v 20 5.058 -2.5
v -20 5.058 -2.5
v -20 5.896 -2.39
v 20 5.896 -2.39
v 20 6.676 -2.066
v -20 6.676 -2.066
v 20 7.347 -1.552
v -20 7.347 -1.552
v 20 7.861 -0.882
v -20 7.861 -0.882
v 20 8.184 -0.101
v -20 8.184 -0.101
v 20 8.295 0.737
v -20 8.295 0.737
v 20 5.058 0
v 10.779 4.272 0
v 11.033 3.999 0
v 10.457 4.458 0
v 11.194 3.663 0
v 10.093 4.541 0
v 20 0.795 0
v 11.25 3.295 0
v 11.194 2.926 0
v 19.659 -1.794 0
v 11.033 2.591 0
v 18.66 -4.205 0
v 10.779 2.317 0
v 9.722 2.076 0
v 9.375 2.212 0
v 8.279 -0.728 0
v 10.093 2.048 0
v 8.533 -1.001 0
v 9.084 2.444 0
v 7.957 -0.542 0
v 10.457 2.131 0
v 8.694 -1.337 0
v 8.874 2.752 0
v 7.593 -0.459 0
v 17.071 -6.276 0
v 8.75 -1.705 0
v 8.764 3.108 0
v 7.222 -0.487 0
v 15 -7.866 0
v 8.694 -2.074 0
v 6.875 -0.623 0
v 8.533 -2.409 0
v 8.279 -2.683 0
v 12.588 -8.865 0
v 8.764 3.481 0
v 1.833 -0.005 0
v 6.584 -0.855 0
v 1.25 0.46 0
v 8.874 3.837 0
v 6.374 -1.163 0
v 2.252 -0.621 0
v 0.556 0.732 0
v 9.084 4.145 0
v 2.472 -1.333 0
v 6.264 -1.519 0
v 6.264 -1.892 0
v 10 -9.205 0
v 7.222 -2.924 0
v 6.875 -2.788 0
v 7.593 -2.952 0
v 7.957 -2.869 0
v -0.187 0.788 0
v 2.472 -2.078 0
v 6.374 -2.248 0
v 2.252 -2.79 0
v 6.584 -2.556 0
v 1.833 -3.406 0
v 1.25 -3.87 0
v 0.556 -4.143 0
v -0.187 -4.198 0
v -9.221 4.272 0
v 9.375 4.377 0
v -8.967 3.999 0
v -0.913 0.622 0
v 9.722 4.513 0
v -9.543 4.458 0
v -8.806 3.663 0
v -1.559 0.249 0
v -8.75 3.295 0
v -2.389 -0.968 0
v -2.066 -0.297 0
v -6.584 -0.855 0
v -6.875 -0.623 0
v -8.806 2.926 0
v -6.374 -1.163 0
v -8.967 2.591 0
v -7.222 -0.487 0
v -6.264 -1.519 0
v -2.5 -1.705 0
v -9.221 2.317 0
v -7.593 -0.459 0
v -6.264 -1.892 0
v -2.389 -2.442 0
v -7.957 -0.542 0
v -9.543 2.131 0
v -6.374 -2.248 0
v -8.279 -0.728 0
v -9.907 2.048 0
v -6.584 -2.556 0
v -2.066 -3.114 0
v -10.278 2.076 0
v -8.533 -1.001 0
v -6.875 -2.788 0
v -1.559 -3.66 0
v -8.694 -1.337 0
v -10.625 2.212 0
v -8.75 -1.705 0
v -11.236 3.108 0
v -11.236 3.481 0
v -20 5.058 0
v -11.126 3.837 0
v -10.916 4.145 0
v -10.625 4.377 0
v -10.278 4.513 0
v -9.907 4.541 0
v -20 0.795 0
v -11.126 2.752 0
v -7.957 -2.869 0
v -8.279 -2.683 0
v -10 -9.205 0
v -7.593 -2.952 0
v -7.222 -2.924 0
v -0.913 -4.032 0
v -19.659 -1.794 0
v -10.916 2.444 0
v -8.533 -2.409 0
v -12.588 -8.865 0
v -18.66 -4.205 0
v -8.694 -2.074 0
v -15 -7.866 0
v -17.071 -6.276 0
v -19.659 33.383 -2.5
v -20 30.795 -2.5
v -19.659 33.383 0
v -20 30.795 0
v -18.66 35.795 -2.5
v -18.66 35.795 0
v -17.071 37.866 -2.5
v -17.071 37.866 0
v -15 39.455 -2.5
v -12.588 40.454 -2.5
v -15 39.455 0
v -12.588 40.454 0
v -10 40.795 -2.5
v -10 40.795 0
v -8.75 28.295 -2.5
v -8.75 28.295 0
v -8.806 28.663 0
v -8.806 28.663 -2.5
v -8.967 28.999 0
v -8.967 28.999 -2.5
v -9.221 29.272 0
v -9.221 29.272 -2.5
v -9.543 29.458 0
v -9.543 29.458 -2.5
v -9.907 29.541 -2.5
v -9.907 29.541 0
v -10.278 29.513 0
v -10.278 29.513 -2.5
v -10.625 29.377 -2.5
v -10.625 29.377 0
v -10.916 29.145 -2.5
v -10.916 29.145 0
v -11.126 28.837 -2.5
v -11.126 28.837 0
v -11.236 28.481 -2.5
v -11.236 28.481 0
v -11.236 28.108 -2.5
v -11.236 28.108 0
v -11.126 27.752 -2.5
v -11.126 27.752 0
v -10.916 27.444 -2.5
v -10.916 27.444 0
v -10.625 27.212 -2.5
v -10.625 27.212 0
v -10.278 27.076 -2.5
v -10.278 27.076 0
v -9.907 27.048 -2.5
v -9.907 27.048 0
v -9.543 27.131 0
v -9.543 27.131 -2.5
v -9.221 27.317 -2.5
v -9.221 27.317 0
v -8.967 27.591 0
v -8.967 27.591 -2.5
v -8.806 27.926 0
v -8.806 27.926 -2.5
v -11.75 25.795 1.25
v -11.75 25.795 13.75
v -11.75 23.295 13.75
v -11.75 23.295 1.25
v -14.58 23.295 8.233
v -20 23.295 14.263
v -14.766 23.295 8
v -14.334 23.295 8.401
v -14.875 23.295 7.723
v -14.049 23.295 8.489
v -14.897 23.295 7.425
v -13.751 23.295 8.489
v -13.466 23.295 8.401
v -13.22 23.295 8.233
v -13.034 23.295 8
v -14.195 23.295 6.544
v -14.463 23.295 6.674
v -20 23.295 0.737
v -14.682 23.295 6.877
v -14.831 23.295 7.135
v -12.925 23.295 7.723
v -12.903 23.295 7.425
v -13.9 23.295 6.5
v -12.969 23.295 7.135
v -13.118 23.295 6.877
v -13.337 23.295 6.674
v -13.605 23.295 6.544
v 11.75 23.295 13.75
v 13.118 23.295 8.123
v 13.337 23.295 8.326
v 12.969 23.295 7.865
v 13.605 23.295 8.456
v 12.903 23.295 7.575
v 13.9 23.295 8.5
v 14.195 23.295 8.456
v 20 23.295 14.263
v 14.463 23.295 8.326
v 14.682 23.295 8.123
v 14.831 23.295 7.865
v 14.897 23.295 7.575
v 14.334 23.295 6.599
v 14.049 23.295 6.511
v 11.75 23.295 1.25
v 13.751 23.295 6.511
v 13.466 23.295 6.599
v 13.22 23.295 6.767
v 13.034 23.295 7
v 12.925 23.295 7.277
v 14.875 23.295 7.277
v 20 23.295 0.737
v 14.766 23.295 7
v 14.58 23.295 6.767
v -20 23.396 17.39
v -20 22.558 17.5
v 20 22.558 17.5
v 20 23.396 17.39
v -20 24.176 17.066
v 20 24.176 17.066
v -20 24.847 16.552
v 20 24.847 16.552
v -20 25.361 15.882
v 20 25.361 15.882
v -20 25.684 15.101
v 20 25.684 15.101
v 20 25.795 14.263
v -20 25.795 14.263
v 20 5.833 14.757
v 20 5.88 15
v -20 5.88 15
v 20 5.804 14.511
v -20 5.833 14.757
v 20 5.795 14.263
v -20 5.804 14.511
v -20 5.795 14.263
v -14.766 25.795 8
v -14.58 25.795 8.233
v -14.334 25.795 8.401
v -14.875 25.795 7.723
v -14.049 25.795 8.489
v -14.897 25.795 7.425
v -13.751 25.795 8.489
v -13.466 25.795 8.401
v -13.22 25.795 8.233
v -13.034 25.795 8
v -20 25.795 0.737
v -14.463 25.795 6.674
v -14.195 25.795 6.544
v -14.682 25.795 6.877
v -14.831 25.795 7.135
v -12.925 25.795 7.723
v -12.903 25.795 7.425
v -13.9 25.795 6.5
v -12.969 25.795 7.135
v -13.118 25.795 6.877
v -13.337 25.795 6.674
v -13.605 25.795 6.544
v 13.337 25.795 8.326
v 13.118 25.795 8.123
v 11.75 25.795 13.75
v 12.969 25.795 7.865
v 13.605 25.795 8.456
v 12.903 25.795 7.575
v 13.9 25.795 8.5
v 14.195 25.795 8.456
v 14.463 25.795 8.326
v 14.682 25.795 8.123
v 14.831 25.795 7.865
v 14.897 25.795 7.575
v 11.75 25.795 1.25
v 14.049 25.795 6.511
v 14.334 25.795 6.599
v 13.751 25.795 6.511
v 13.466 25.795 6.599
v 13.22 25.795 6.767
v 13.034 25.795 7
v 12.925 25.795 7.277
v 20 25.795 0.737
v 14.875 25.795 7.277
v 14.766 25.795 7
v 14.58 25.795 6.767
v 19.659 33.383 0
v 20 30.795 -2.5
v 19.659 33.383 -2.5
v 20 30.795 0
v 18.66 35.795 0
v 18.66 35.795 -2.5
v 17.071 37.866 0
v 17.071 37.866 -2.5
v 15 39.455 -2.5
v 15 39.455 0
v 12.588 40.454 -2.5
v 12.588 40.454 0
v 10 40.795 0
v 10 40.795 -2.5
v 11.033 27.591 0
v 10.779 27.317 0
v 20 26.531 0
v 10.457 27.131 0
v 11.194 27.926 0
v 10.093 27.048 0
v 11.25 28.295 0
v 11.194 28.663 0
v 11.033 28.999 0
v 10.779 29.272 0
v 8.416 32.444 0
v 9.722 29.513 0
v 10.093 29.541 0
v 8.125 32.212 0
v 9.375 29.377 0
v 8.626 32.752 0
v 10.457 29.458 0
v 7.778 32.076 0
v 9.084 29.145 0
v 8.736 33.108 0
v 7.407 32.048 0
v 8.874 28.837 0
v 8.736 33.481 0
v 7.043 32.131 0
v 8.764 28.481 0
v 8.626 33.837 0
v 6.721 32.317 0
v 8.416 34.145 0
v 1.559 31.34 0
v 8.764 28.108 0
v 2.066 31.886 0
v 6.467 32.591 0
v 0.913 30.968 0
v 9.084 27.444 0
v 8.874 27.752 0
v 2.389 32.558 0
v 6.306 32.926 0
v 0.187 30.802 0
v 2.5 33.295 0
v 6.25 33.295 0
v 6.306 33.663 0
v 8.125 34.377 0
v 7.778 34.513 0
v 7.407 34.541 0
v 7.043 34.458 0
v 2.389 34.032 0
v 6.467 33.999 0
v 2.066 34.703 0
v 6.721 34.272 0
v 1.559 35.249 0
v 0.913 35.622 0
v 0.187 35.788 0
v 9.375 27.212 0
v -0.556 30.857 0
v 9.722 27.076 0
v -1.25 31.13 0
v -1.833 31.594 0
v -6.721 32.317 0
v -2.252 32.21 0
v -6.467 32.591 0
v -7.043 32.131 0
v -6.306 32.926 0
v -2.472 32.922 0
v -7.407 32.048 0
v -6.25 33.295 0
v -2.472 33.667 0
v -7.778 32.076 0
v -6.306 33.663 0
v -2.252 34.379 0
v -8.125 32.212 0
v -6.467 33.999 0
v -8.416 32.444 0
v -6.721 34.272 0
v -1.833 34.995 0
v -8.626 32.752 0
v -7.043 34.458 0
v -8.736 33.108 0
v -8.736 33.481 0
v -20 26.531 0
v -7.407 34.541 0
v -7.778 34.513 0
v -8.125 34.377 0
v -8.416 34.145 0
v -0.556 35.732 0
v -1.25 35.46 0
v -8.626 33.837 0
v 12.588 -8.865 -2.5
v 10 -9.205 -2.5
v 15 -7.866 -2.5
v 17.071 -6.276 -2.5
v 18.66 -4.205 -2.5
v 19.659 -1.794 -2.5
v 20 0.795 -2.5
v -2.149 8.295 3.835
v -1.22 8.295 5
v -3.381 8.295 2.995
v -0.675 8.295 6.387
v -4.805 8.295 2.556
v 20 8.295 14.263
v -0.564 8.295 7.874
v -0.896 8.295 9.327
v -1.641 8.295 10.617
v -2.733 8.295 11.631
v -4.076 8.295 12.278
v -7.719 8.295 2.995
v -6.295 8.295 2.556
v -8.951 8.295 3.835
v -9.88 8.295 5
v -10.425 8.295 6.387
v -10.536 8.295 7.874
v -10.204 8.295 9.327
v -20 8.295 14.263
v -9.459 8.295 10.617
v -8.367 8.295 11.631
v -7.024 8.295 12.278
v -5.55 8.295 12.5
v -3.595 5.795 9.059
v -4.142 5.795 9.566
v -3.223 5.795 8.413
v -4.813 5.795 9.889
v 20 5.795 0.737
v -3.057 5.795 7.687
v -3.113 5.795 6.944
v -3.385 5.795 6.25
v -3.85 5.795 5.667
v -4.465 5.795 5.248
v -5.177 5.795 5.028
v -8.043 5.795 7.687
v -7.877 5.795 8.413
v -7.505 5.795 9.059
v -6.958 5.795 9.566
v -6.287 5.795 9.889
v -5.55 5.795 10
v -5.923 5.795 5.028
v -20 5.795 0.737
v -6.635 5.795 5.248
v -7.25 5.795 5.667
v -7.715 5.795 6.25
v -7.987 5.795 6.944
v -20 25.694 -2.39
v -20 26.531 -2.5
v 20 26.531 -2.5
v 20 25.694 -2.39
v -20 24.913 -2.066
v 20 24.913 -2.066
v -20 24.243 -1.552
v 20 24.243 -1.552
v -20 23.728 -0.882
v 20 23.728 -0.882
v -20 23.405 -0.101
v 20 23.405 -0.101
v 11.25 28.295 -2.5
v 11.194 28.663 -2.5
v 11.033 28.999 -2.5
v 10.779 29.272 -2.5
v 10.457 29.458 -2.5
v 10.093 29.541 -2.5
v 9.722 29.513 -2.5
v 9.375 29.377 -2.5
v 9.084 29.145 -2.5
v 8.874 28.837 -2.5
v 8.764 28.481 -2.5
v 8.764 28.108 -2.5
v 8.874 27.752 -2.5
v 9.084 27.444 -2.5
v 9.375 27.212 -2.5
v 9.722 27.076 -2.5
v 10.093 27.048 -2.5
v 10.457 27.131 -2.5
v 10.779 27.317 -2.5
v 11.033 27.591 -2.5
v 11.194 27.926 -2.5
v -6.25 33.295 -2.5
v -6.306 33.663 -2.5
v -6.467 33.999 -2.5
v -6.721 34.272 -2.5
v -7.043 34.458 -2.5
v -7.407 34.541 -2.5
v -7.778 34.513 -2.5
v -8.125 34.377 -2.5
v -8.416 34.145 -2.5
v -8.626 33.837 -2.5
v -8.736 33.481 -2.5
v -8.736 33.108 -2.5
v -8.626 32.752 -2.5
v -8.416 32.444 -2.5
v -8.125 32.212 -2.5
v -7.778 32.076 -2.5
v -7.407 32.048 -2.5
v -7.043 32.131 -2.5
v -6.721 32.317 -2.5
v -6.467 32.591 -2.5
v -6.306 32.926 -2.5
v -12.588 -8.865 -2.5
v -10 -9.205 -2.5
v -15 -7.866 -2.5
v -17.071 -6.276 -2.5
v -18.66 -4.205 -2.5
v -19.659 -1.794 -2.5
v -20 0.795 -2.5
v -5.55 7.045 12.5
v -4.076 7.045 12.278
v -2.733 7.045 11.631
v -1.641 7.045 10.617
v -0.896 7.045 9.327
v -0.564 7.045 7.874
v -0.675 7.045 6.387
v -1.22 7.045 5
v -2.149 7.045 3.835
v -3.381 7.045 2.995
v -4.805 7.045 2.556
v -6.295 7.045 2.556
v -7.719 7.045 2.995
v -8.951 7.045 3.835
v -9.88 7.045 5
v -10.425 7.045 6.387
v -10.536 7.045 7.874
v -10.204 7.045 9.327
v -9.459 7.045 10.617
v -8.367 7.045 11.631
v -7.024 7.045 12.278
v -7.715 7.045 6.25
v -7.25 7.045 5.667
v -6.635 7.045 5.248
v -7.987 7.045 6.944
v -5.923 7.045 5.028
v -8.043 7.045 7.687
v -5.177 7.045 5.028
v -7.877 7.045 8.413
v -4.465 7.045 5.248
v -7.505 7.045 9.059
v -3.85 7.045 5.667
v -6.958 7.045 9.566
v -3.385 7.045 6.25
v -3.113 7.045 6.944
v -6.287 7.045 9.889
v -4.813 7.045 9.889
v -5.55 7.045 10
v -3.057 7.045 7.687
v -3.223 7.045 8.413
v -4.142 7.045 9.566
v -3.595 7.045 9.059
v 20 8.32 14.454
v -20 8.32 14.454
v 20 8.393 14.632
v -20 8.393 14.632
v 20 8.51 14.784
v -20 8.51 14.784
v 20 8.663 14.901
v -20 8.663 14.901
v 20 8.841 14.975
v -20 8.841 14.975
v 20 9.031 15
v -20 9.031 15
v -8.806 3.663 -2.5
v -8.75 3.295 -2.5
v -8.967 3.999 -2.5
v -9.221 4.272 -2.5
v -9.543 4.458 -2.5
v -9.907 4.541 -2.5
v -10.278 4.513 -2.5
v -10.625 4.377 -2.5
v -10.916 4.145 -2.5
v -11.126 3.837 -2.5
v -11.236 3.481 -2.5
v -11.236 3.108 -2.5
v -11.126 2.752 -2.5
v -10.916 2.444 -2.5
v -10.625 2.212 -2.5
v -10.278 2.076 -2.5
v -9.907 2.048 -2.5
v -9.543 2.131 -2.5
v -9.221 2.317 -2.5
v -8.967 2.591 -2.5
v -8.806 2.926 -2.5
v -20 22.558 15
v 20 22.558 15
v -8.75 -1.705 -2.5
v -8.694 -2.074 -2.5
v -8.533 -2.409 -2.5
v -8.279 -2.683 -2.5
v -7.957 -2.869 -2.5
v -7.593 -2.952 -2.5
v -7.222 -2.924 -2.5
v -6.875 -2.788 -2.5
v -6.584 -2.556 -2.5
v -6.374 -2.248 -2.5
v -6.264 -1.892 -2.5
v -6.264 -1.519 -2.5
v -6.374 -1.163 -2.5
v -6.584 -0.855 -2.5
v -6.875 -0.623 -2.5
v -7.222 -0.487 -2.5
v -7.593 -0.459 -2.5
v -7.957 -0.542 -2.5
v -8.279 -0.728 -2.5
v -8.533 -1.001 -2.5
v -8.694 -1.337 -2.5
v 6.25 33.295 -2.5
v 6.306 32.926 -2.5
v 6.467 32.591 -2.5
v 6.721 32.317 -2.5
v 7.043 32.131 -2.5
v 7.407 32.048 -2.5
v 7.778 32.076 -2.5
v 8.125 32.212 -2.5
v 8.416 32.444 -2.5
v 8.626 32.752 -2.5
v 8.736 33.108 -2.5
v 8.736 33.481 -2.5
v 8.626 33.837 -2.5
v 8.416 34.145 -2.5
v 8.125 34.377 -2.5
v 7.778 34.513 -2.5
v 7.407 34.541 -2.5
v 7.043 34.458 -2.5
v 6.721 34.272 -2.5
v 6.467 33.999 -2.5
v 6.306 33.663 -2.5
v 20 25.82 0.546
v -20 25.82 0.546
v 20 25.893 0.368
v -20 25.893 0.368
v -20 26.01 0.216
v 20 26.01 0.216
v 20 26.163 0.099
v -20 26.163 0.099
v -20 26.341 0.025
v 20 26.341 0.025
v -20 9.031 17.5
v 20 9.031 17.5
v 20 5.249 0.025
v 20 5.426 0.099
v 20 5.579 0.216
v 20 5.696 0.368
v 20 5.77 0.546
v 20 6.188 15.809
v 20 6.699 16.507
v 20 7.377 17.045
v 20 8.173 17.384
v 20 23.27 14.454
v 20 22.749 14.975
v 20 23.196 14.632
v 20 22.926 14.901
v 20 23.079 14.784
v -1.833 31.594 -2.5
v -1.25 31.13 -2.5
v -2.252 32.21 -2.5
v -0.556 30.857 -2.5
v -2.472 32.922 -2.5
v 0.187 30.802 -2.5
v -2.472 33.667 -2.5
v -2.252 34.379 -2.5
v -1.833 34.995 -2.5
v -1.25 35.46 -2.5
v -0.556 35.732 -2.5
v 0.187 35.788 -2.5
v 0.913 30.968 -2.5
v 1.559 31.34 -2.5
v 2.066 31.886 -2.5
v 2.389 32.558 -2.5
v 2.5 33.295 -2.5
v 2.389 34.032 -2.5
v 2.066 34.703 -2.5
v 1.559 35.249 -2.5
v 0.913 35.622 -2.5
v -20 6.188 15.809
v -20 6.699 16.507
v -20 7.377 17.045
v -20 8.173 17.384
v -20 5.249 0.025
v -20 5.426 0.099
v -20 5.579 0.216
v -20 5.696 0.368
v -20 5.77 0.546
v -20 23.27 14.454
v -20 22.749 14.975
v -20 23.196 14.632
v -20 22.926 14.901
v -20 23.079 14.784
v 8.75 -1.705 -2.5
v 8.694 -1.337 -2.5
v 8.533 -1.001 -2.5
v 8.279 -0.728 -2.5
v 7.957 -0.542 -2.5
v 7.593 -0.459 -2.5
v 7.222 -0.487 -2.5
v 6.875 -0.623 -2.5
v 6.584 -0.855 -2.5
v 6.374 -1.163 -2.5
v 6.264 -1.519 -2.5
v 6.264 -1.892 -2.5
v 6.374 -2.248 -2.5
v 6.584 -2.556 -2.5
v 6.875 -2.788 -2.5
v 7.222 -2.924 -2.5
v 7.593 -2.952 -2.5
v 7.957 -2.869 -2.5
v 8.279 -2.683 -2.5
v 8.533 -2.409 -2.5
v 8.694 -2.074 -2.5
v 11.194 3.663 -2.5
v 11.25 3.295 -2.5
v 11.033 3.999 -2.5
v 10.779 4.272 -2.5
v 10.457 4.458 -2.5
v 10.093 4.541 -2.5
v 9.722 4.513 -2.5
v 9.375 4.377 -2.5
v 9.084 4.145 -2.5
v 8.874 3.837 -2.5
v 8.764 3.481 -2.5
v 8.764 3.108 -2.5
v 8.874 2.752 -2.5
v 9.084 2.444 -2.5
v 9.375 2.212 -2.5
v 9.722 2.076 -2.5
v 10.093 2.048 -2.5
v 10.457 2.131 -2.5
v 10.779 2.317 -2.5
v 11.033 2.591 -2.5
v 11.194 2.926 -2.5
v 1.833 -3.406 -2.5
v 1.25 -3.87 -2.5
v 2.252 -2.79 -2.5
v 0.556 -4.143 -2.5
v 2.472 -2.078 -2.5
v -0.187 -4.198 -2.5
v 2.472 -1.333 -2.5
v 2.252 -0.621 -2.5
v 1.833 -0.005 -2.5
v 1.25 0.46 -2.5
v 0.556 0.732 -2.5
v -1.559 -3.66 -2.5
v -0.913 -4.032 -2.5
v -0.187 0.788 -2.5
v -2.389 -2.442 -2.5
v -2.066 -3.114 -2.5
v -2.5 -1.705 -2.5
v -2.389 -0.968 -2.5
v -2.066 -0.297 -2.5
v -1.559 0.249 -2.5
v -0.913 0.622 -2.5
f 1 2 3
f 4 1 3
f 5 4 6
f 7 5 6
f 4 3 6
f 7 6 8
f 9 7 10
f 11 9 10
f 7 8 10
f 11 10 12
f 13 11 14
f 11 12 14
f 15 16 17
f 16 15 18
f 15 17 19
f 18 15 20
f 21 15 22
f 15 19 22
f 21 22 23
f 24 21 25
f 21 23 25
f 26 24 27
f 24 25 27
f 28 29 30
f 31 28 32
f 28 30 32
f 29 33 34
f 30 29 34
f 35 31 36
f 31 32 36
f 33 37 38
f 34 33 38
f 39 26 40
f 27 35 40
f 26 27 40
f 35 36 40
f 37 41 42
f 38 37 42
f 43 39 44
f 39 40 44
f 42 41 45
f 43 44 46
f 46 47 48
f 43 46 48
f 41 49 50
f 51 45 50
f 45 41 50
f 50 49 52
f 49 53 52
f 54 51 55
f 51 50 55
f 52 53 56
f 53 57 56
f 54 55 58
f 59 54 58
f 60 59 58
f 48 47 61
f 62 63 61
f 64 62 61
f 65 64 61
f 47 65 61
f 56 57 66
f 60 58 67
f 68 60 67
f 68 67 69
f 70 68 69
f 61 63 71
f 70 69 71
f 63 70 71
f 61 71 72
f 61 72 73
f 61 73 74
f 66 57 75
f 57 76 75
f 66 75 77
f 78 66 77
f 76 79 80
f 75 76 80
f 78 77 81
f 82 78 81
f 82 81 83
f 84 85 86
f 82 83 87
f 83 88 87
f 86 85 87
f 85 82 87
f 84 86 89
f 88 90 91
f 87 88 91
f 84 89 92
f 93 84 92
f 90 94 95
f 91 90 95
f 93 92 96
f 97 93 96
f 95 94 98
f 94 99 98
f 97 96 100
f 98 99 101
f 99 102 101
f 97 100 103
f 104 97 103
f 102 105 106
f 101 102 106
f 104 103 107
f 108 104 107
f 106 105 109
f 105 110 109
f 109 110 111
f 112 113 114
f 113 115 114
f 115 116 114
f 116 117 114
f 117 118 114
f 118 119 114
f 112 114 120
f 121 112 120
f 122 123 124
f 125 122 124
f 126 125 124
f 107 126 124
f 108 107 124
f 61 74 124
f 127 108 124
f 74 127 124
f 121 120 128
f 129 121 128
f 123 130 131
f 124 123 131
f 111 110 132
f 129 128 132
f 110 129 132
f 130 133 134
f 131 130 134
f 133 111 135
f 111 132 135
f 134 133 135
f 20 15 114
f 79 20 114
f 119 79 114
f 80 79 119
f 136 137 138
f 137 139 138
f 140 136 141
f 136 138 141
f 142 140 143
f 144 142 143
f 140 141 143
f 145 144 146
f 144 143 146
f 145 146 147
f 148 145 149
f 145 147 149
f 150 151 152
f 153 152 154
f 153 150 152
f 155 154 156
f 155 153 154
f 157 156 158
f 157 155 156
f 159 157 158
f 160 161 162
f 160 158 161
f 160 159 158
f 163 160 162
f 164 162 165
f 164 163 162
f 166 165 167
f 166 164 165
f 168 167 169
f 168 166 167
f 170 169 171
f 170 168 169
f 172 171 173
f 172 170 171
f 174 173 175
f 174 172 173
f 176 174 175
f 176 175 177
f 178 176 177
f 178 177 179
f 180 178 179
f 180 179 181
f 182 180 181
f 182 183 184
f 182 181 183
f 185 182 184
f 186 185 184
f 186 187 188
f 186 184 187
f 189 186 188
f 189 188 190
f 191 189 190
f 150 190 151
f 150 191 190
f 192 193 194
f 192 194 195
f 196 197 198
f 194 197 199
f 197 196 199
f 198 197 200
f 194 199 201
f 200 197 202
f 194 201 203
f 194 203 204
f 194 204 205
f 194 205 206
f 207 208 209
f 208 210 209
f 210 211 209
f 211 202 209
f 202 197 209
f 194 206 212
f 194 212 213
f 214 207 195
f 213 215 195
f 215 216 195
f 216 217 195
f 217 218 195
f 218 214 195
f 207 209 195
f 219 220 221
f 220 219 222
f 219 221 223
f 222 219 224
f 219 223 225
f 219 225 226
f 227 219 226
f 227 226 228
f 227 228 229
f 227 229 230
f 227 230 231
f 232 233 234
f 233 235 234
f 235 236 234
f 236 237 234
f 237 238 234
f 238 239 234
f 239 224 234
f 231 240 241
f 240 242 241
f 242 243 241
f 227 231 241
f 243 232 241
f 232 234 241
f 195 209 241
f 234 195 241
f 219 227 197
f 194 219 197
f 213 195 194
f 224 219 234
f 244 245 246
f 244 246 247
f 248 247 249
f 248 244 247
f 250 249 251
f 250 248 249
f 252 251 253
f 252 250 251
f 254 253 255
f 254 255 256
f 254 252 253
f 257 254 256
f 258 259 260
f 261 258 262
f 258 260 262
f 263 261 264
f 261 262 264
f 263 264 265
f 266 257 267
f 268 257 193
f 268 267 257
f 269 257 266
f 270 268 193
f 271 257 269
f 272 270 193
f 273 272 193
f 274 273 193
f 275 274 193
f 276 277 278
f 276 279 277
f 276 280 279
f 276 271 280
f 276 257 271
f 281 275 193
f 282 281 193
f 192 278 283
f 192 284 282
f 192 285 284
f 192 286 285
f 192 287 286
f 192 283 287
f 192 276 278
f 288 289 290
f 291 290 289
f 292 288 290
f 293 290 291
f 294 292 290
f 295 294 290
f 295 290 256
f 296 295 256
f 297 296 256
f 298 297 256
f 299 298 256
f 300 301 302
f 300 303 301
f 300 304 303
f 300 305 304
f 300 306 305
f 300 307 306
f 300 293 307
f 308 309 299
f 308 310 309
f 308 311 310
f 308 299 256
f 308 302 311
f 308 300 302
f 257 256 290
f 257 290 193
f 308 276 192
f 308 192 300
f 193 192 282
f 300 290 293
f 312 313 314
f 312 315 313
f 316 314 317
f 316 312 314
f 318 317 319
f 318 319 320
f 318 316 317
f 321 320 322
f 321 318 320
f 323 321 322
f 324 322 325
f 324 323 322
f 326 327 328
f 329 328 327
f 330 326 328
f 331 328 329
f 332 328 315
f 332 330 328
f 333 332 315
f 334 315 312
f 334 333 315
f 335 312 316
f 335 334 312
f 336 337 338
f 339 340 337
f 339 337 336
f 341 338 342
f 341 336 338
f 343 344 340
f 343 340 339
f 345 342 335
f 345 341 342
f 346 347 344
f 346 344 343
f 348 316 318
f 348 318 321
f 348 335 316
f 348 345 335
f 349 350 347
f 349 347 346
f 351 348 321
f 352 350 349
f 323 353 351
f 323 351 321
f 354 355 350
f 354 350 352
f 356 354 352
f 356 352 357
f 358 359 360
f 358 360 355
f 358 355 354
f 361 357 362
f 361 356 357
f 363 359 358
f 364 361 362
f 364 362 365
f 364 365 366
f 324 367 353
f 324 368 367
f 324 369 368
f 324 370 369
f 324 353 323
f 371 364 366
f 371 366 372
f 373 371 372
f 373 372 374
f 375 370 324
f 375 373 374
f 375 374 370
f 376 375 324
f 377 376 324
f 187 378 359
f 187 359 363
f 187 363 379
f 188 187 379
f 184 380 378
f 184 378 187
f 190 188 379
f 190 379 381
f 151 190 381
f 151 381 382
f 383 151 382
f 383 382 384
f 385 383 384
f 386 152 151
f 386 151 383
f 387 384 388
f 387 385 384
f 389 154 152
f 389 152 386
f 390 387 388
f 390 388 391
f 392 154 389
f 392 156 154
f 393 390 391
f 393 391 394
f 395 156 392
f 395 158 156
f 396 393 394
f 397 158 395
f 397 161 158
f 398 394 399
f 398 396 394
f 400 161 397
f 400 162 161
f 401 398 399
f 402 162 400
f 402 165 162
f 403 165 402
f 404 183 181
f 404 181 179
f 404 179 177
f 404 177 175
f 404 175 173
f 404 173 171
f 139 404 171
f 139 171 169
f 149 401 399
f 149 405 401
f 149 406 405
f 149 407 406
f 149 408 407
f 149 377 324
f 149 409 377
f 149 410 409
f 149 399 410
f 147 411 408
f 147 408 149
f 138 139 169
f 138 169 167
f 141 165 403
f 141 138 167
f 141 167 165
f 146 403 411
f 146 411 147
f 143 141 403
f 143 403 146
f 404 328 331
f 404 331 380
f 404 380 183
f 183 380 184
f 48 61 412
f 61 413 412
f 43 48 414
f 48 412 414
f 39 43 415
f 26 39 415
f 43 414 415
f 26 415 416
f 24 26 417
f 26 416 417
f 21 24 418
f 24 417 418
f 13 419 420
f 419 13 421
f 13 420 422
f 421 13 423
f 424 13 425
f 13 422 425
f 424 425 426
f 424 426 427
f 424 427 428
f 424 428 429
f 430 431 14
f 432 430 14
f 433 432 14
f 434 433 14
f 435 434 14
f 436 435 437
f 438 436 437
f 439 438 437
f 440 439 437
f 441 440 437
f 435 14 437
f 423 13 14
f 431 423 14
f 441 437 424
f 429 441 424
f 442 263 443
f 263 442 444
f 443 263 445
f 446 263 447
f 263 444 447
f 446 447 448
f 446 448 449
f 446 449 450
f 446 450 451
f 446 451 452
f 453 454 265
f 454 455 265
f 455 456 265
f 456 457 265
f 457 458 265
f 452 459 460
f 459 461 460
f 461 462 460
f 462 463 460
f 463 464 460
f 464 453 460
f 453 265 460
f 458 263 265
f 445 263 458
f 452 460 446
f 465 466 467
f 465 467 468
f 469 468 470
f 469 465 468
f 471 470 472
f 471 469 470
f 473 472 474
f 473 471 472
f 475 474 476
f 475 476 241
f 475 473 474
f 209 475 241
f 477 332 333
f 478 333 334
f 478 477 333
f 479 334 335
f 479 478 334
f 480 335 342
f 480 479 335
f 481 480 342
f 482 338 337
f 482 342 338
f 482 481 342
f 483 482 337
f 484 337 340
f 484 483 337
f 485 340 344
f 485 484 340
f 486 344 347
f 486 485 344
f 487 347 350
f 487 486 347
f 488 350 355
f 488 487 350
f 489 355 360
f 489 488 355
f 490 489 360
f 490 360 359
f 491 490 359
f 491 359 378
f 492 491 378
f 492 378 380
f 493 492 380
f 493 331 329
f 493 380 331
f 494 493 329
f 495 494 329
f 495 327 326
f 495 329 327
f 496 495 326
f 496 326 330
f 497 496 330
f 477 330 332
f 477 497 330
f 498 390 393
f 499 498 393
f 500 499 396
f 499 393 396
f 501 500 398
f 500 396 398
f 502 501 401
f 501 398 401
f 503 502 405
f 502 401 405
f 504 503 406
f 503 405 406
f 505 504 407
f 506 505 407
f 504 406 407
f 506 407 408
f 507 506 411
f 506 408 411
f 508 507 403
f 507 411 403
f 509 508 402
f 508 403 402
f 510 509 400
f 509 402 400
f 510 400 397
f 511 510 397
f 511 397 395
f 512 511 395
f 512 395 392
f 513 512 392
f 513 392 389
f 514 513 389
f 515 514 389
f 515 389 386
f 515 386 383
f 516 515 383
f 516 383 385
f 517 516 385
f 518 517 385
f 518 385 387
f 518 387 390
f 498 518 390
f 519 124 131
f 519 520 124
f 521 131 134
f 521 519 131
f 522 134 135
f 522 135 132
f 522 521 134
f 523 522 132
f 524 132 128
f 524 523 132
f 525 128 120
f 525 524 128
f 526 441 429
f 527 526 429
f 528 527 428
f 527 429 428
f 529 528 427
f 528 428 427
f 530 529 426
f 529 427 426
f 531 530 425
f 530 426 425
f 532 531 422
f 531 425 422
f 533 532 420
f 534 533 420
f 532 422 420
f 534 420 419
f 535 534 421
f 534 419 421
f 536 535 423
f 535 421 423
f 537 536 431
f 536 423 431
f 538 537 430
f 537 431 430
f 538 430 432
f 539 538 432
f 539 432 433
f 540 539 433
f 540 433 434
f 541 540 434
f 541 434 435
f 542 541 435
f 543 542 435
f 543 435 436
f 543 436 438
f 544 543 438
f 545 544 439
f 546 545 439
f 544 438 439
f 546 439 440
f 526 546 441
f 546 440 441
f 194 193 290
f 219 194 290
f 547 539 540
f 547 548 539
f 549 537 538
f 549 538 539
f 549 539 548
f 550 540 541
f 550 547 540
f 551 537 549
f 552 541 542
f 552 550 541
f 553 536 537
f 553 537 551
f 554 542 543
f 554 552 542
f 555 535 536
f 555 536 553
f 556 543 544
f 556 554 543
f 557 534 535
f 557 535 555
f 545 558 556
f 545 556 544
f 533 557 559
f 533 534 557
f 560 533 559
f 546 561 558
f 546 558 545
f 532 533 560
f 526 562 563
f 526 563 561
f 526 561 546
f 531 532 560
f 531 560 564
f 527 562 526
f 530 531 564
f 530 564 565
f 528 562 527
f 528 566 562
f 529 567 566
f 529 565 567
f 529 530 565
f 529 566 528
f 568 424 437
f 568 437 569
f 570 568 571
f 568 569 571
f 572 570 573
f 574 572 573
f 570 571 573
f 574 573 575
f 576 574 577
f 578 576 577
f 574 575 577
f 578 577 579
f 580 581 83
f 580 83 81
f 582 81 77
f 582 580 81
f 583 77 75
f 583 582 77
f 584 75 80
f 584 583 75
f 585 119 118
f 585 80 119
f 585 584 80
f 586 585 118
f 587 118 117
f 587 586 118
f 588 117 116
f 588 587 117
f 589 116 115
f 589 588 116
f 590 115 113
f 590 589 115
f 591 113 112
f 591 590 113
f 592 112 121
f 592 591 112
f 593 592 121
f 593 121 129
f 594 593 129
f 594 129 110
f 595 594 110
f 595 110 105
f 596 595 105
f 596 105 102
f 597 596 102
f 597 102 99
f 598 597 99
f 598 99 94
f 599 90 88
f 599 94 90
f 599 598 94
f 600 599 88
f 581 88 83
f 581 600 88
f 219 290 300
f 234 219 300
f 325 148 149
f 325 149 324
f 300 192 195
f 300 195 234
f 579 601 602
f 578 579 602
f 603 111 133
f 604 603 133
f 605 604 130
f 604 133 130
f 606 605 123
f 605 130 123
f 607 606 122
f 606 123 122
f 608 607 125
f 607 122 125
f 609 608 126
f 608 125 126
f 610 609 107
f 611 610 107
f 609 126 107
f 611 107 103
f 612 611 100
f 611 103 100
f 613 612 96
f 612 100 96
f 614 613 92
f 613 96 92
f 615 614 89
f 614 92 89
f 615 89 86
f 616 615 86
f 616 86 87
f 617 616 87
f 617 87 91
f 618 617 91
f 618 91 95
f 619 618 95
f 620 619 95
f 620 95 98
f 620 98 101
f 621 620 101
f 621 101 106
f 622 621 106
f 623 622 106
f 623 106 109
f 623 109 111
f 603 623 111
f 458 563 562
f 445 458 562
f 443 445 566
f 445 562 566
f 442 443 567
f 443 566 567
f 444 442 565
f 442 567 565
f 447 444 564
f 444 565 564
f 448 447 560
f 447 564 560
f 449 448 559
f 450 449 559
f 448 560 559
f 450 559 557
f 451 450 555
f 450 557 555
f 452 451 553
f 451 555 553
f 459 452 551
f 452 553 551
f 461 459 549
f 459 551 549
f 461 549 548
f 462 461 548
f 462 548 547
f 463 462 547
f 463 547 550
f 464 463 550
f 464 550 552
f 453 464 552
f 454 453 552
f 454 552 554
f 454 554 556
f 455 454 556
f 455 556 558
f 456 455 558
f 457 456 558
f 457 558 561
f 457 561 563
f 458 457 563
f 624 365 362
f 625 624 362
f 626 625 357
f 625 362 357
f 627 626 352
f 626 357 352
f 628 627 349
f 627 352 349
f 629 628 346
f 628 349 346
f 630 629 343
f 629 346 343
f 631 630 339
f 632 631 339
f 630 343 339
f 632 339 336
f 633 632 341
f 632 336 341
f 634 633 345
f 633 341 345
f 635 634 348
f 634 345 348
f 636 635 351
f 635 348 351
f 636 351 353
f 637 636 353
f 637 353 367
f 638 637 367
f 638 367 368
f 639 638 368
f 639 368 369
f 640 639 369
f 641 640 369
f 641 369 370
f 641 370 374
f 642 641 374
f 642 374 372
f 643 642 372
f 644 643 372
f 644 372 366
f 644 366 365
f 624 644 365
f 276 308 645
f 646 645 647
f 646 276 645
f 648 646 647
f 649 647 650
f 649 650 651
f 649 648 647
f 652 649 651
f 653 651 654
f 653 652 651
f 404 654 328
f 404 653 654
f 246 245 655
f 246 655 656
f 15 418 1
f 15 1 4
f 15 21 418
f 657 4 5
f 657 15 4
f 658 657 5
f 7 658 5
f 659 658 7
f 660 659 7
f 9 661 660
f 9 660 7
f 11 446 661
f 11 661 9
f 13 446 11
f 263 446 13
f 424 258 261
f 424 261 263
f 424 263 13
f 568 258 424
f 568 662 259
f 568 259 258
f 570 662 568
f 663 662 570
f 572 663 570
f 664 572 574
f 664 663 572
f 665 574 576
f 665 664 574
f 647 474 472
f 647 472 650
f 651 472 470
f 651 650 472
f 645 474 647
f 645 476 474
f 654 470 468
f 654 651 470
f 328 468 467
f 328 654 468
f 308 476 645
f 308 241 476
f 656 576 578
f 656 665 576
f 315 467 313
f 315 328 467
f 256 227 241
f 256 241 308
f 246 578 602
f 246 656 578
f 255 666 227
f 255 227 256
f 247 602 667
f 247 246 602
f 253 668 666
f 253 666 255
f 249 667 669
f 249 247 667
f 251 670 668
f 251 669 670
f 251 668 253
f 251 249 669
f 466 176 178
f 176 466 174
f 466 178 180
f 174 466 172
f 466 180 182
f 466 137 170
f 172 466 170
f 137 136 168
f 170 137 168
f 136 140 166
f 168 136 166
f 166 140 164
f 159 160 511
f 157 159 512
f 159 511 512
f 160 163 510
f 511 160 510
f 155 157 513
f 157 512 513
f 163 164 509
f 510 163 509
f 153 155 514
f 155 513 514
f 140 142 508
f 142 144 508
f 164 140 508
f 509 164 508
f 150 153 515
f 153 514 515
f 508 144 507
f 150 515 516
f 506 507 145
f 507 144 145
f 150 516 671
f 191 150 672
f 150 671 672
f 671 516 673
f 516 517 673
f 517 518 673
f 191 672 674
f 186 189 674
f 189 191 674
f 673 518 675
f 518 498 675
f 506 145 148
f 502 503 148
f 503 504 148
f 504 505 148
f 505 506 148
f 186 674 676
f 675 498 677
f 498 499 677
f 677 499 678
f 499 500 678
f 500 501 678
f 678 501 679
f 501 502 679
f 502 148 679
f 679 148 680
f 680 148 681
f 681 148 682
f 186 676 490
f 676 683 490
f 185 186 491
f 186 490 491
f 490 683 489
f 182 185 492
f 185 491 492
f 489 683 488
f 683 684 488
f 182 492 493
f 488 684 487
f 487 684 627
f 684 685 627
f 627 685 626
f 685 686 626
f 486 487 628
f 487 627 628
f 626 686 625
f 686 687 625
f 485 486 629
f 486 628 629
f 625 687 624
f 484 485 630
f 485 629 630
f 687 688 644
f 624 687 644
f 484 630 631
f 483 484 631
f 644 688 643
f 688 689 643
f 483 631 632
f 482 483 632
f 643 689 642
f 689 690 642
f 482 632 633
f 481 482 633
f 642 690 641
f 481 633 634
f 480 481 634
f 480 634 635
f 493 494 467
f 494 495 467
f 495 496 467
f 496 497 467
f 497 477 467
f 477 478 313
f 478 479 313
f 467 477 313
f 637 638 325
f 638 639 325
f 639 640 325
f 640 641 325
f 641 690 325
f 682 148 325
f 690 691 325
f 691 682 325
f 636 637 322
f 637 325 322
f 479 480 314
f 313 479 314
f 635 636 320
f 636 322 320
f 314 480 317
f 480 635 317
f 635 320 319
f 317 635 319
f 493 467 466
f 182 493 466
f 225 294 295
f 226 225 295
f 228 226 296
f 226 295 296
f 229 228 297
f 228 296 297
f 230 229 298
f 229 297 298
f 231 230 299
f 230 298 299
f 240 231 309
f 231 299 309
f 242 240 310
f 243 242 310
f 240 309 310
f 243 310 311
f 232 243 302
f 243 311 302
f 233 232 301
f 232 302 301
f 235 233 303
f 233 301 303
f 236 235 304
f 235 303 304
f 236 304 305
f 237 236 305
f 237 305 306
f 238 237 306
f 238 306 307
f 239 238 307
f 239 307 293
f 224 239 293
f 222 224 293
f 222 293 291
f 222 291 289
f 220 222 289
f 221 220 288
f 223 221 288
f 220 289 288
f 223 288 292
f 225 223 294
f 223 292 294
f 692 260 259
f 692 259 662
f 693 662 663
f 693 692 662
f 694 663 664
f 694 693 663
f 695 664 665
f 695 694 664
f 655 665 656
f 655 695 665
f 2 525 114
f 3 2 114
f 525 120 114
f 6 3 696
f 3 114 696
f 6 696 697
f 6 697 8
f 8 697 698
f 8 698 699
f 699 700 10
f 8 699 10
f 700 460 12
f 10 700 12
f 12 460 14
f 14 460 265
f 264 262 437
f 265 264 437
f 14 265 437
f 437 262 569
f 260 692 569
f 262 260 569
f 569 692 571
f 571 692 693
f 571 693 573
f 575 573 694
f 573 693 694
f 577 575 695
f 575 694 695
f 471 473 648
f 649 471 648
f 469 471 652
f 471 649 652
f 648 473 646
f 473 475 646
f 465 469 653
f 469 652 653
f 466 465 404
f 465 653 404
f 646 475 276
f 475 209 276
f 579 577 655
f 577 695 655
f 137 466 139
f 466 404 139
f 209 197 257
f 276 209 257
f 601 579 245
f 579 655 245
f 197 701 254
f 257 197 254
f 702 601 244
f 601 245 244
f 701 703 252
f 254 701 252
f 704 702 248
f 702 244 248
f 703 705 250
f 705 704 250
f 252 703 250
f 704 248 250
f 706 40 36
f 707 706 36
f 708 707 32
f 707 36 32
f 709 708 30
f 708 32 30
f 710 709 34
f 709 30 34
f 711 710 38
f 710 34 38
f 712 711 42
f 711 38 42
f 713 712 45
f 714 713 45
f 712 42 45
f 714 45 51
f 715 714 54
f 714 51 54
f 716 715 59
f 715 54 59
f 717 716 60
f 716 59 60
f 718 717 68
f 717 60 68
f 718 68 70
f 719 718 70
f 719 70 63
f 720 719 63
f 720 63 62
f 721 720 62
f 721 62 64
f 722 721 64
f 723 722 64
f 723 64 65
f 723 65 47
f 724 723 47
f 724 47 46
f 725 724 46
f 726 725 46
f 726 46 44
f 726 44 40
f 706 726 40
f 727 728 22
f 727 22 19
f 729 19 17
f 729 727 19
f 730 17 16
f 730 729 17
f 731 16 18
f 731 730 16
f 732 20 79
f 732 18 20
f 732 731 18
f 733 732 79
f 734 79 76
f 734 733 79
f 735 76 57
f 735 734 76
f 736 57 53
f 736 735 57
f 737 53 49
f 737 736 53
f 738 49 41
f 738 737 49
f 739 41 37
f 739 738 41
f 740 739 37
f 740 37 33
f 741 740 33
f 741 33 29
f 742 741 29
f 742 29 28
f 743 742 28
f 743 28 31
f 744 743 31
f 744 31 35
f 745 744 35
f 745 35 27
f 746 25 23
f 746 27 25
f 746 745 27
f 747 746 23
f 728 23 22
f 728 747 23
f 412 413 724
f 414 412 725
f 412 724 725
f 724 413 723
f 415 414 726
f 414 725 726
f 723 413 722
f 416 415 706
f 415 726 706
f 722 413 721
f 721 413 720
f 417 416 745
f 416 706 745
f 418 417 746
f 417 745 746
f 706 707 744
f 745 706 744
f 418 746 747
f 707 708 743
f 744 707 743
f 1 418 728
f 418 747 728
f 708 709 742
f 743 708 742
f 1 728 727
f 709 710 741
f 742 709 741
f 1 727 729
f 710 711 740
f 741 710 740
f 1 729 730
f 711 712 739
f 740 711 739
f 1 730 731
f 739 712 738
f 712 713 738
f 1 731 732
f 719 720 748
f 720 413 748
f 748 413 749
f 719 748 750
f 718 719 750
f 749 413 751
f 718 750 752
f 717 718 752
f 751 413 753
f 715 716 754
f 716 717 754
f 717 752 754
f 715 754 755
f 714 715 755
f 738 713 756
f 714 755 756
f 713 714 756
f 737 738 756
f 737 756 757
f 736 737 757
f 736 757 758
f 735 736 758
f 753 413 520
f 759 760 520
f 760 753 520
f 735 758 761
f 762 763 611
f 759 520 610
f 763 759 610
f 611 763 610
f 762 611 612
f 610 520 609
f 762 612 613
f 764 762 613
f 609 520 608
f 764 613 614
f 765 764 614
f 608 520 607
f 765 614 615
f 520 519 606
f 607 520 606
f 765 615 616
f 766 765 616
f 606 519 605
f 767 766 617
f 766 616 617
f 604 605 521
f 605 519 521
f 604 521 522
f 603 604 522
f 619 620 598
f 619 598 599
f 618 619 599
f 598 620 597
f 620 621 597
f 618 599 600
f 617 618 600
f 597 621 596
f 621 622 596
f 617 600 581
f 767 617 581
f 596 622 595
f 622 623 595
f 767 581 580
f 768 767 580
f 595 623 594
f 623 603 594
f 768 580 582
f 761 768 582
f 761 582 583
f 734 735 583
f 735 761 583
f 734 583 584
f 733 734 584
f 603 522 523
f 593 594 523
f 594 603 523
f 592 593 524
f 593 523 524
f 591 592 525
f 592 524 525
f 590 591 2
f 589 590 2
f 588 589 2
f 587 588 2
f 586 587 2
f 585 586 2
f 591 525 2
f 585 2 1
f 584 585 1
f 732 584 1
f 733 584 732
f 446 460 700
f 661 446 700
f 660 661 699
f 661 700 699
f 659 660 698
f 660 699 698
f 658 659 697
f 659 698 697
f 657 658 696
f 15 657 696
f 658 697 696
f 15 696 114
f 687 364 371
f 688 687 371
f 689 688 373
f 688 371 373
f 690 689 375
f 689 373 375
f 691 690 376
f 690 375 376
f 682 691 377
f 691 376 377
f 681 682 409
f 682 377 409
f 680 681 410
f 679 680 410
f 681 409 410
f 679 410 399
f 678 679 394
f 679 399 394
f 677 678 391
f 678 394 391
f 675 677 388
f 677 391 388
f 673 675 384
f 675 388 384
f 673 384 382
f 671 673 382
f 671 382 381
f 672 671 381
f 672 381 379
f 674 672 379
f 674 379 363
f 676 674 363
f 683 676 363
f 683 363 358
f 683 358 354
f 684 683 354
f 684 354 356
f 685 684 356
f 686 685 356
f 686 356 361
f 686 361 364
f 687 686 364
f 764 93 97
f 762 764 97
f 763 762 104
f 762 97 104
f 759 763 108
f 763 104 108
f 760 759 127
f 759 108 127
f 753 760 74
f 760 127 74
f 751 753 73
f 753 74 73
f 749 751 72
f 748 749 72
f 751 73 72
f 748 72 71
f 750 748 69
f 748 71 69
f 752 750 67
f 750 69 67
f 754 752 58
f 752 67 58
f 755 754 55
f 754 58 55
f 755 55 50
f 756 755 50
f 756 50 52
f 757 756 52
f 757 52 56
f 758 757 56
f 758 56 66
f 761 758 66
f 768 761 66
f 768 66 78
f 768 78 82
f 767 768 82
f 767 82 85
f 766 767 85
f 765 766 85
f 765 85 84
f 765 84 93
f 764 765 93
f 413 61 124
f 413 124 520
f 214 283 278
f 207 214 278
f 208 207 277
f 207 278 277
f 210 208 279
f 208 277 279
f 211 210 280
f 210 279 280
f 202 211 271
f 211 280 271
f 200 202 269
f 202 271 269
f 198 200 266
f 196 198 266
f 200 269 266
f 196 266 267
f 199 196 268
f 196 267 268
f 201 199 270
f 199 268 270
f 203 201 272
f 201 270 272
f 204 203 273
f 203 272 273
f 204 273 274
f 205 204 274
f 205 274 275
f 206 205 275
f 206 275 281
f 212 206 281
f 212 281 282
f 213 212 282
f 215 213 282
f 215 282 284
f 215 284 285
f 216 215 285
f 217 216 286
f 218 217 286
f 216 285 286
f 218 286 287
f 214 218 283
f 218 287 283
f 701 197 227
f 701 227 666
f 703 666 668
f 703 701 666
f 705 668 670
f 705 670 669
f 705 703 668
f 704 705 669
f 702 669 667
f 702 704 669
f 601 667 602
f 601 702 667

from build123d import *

# Parameters (mm, degrees)
SKETCH1_W           = 40
SKETCH1_H           = 50
SKETCH1_R           = 1.25
BASE_FLANGE1_DEPTH  = 2.5
SKETCH15_R          = 1
CUT_EXTRUDE3_DEPTH  = 10
JOG3_START          = -2.5
JOG3_OUTLINE_W      = 40
JOG3_OUTLINE_H      = 48.294687966
JOG3_OUTLINE_R      = 1
JOG3_OUTLINE_R_2    = 1.25
JOG3_DEPTH          = 2.5
JOG3_2_OUTLINE_W    = 40
JOG3_2_OUTLINE_H    = 1.705312034
JOG3_2_DEPTH        = 0.332528284
JOG3_START_2        = 14.2634
JOG3_3_OUTLINE_W    = 40
JOG3_3_OUTLINE_H    = 35
JOG3_3_OUTLINE_R    = 1
JOG3_3_OUTLINE_R_2  = 1.25
JOG3_3_DEPTH        = 3.2366
JOG3_4_OUTLINE_W    = 40
JOG3_4_OUTLINE_H    = 15.794687966
JOG3_4_OUTLINE_R    = 1.25
JOG3_4_DEPTH        = 3.2366
JOG3_5_OUTLINE_W    = 40
JOG3_5_OUTLINE_H    = 2.5
JOG3_5_DEPTH        = 15
JOG3_START_3        = 15
JOG3_6_OUTLINE_R    = 1.25
JOG3_6_OUTLINE_R_2  = 1
JOG3_6_DEPTH        = 2.5
JOG3_START_4        = -20
JOG3_7_DEPTH        = 40
JOG4_START          = -20
JOG4_DEPTH          = 40
JOG4_2_DEPTH        = 40
JOG4_START_2        = -3
JOG4_3_OUTLINE_R    = 1.25
JOG4_3_DEPTH        = 4
FILLET1_R           = 10
SKETCH18_R          = 2.5
BOSS_EXTRUDE1_DEPTH = 2.5
SKETCH19_R          = 1
SKETCH19_W          = 23.5
SKETCH19_H          = 12.5
CUT_EXTRUDE4_DEPTH  = 2.5
SKETCH20_R          = 2.5
SKETCH20_R_2        = 1.25
CUT_EXTRUDE6_DEPTH  = 10
SKETCH23_R          = 2.5
CUT_EXTRUDE7_DEPTH  = 44.945989578
SKETCH24_R          = 5
CUT_EXTRUDE8_DEPTH  = 1.25


with BuildPart() as part:
    # Base-Flange1: sheet metal written as solids
    # Sketch1 → Base-Flange1 (new body)
    with BuildSketch(Plane.XY):
        Rectangle(SKETCH1_W, SKETCH1_H)
        with Locations((10, 12.5)):
            Circle(SKETCH1_R, mode=Mode.SUBTRACT)
        with Locations(Location((10, -12.5, 0), (0, 0, 180))):
            Circle(SKETCH1_R, mode=Mode.SUBTRACT)
        with Locations((-10, -12.5)):
            Circle(SKETCH1_R, mode=Mode.SUBTRACT)
        with Locations(Location((-10, 12.5, 0), (0, 0, 180))):
            Circle(SKETCH1_R, mode=Mode.SUBTRACT)
    extrude(amount=-BASE_FLANGE1_DEPTH)

    # Sketch15 → Cut-Extrude3 (cut)
    with BuildSketch(Plane.XY):
        with Locations((12, 0)):
            Circle(SKETCH15_R)
        with Locations(Location((-17, 0, 0), (0, 0, 180))):
            Circle(SKETCH15_R)
    extrude(amount=-CUT_EXTRUDE3_DEPTH, mode=Mode.SUBTRACT)

    # Jog3: read off the stored shape, not the designer's step
    # Jog3 outline → Jog3 (cut)
    with BuildSketch(Plane.XY.offset(JOG3_START)):
        with Locations((0, -0.852656017)):
            Rectangle(JOG3_OUTLINE_W, JOG3_OUTLINE_H)
        with Locations((-17, 0)):
            Circle(JOG3_OUTLINE_R, mode=Mode.SUBTRACT)
        with Locations((12, 0)):
            Circle(JOG3_OUTLINE_R, mode=Mode.SUBTRACT)
        with Locations((-10, 12.5)):
            Circle(JOG3_OUTLINE_R_2, mode=Mode.SUBTRACT)
        with Locations((10, 12.5)):
            Circle(JOG3_OUTLINE_R_2, mode=Mode.SUBTRACT)
        with Locations((10, -12.5)):
            Circle(JOG3_OUTLINE_R_2, mode=Mode.SUBTRACT)
        with Locations((-10, -12.5)):
            Circle(JOG3_OUTLINE_R_2, mode=Mode.SUBTRACT)
    extrude(amount=JOG3_DEPTH, mode=Mode.SUBTRACT)

    # Jog3 2 outline → Jog3 2 (cut)
    with BuildSketch(Plane.XY.offset(JOG3_START)):
        with Locations((0, 24.147343983)):
            Rectangle(JOG3_2_OUTLINE_W, JOG3_2_OUTLINE_H)
    extrude(amount=JOG3_2_DEPTH, mode=Mode.SUBTRACT)

    # Jog3 4 outline → Jog3 4 (add)
    with BuildSketch(Plane.XY.offset(JOG3_START)):
        with Locations((0, 32.897343983)):
            Rectangle(JOG3_4_OUTLINE_W, JOG3_4_OUTLINE_H)
        with Locations((10, 28.294687966)):
            Circle(JOG3_4_OUTLINE_R, mode=Mode.SUBTRACT)
        with Locations((-10, 28.294687966)):
            Circle(JOG3_4_OUTLINE_R, mode=Mode.SUBTRACT)
    extrude(amount=JOG3_4_DEPTH)



with BuildPart() as body_2:
    # Jog3 3 outline → Jog3 3 (new body)
    with BuildSketch(Plane.XY.offset(JOG3_START_2)):
        with Locations((0, 8.294687966)):
            Rectangle(JOG3_3_OUTLINE_W, JOG3_3_OUTLINE_H)
        with Locations((12, 15.794687966)):
            Circle(JOG3_3_OUTLINE_R, mode=Mode.SUBTRACT)
        with Locations((-17, 0)):
            Circle(JOG3_3_OUTLINE_R, mode=Mode.SUBTRACT)
        with Locations((-10, 3.294687966)):
            Circle(JOG3_3_OUTLINE_R_2, mode=Mode.SUBTRACT)
        with Locations((12, 0)):
            Circle(JOG3_3_OUTLINE_R, mode=Mode.SUBTRACT)
        with Locations((10, 3.294687966)):
            Circle(JOG3_3_OUTLINE_R_2, mode=Mode.SUBTRACT)
        with Locations((-17, 15.794687966)):
            Circle(JOG3_3_OUTLINE_R, mode=Mode.SUBTRACT)
        with Locations((-10, 12.5)):
            Circle(JOG3_3_OUTLINE_R_2, mode=Mode.SUBTRACT)
        with Locations((10, 12.5)):
            Circle(JOG3_3_OUTLINE_R_2, mode=Mode.SUBTRACT)
    extrude(amount=JOG3_3_DEPTH)


with BuildPart() as part_1:
    add(part.part)

    add(body_2.part)  # Jog3 5 merges body 2
    # Jog3 5 outline → Jog3 5 (add)
    with BuildSketch(Plane.XY):
        with Locations((0, 24.544687966)):
            Rectangle(JOG3_5_OUTLINE_W, JOG3_5_OUTLINE_H)
    extrude(amount=JOG3_5_DEPTH)

    # Jog3 6 outline → Jog3 6 (add)
    with BuildSketch(Plane.XY.offset(JOG3_START_3)):
        with Locations((10, 12.5)):
            Circle(JOG3_6_OUTLINE_R)
        with Locations((-10, 12.5)):
            Circle(JOG3_6_OUTLINE_R)
        with Locations((12, 0)):
            Circle(JOG3_6_OUTLINE_R_2)
        with Locations((-17, 0)):
            Circle(JOG3_6_OUTLINE_R_2)
    extrude(amount=JOG3_6_DEPTH)

    # Jog3 7 outline → Jog3 7 (cut)
    with BuildSketch(Plane.YZ.offset(JOG3_START_4)):
        with BuildLine():
            ThreePointArc((23.294687966, 14.2634), (23.078942821, 14.784254855), (22.558087966, 15))
            Line((22.558087966, 15), (-9.205312034, 15))
            Line((-9.205312034, 15), (-9.205312034, 14.2634))
            Line((-9.205312034, 14.2634), (23.294687966, 14.2634))
        make_face()
        with BuildLine():
            ThreePointArc((26.531287966, -2.5), (24.242666158, -1.552021808), (23.294687966, 0.7366))
            Line((23.294687966, 0.7366), (23.294687966, -2.167471716))
            Line((23.294687966, -2.167471716), (25, -2.167471716))
            Line((25, -2.167471716), (25, -2.5))
            Line((25, -2.5), (26.531287966, -2.5))
        make_face()
        with BuildLine():
            Line((26.531287966, 0), (40.794687966, 0))
            Line((40.794687966, 0), (40.794687966, 0.7366))
            Line((40.794687966, 0.7366), (25.794687966, 0.7366))
            ThreePointArc((25.794687966, 0.7366), (26.010433111, 0.215745145), (26.531287966, 0))
        make_face()
        with BuildLine():
            Line((25.794687966, 17.5), (22.558087966, 17.5))
            ThreePointArc((22.558087966, 17.5), (24.846709774, 16.552021808), (25.794687966, 14.2634))
            Line((25.794687966, 14.2634), (25.794687966, 17.5))
        make_face()
    extrude(amount=JOG3_7_DEPTH, mode=Mode.SUBTRACT)

    # Jog4: read off the stored shape, not the designer's step
    # Jog4 outline → Jog4 (cut)
    with BuildSketch(Plane.YZ.offset(JOG4_START)):
        with BuildLine():
            Line((-9.205312034, 15), (5.87962174, 15))
            ThreePointArc((5.87962174, 15), (7.019882984, 16.799110859), (9.031287966, 17.5))
            Line((9.031287966, 17.5), (-9.205312034, 17.5))
            Line((-9.205312034, 17.5), (-9.205312034, 15))
        make_face()
    extrude(amount=JOG4_DEPTH, mode=Mode.SUBTRACT)

    # Jog4 2 outline → Jog4 2 (add)
    with BuildSketch(Plane.YZ.offset(JOG4_START)):
        with BuildLine():
            Line((-9.205312034, 0), (-9.205312034, -2.5))
            Line((-9.205312034, -2.5), (5.058087966, -2.5))
            ThreePointArc((5.058087966, -2.5), (7.346709774, -1.552021808), (8.294687966, 0.7366))
            Line((8.294687966, 0.7366), (8.294687966, 14.2634))
            ThreePointArc((8.294687966, 14.2634), (8.510433111, 14.784254855), (9.031287966, 15))
            Line((9.031287966, 15), (5.87962174, 15))
            ThreePointArc((5.87962174, 15), (5.81599152, 14.634140241), (5.794687966, 14.2634))
            Line((5.794687966, 14.2634), (5.794687966, 0.7366))
            ThreePointArc((5.794687966, 0.7366), (5.578942821, 0.215745145), (5.058087966, 0))
            Line((5.058087966, 0), (-9.205312034, 0))
        make_face()
    extrude(amount=JOG4_2_DEPTH)

    # Jog4 3 outline → Jog4 3 (cut)
    with BuildSketch(Plane.XY.offset(JOG4_START_2)):
        with Locations((-10, 3.294687966)):
            Circle(JOG4_3_OUTLINE_R)
        with Locations((10, 3.294687966)):
            Circle(JOG4_3_OUTLINE_R)
    extrude(amount=JOG4_3_DEPTH, mode=Mode.SUBTRACT)

    # Fillet1
    fillet1_edges = [part_1.edges().sort_by_distance(p)[0] for p in [
        (20, -9.205312034, -1.25),
        (-20, -9.205312034, -1.25),
        (-20, 40.794687966, -1.25),
        (20, 40.794687966, -1.25),
    ]]
    fillet(fillet1_edges, radius=FILLET1_R)

    # Sketch18 → Boss-Extrude1 (add)
    with BuildSketch(Plane.XY.offset(17.5)):
        with Locations((12, 15.794687966)):
            Circle(SKETCH18_R)
        with Locations((-17, 15.794687966)):
            Circle(SKETCH18_R)
    extrude(amount=-BOSS_EXTRUDE1_DEPTH)

    # Sketch19 → Cut-Extrude4 (cut)
    with BuildSketch(Plane(origin=(0, 25.794687966, 0), x_dir=(1, 0, 0), z_dir=(0, 1, 0))):
        with Locations(Location((13.9, -7.5, 0), (0, 0, 270))):
            Circle(SKETCH19_R)
        with Locations(Location((-13.9, -7.5, 0), (0, 0, 90))):
            Circle(SKETCH19_R)
        with Locations((0, -7.5)):
            Rectangle(SKETCH19_W, SKETCH19_H)
    extrude(amount=-CUT_EXTRUDE4_DEPTH, mode=Mode.SUBTRACT)

    # Sketch20 → Cut-Extrude6 (cut)
    with BuildSketch(Plane.XY):
        with Locations((0, 33.294687966)):
            Circle(SKETCH20_R)
        with Locations(Location((0, -1.705312034, 0), (0, 0, 180))):
            Circle(SKETCH20_R)
        with Locations((7.5, -1.705312034)):
            Circle(SKETCH20_R_2)
        with Locations(Location((-7.5, -1.705312034, 0), (0, 0, 180))):
            Circle(SKETCH20_R_2)
        with Locations(Location((7.5, 33.294687966, 0), (0, 0, 180))):
            Circle(SKETCH20_R_2)
        with Locations((-7.5, 33.294687966)):
            Circle(SKETCH20_R_2)
    extrude(amount=-CUT_EXTRUDE6_DEPTH, mode=Mode.SUBTRACT)

    # Sketch23 → Cut-Extrude7 (cut, through all)
    with BuildSketch(Plane(origin=(0, 25.794687966, 0), x_dir=(1, 0, 0), z_dir=(0, 1, 0))):
        with Locations(Location((-5.55, -7.5, 0), (0, 0, 270))):
            Circle(SKETCH23_R)
    extrude(amount=-CUT_EXTRUDE7_DEPTH, mode=Mode.SUBTRACT)

    # Sketch24 → Cut-Extrude8 (cut)
    with BuildSketch(Plane(origin=(0, 8.294687966, 0), x_dir=(1, 0, 0), z_dir=(0, 1, 0))):
        with Locations(Location((-5.55, -7.5, 0), (0, 0, 270))):
            Circle(SKETCH24_R)
    extrude(amount=-CUT_EXTRUDE8_DEPTH, mode=Mode.SUBTRACT)


solid = part_1.part
